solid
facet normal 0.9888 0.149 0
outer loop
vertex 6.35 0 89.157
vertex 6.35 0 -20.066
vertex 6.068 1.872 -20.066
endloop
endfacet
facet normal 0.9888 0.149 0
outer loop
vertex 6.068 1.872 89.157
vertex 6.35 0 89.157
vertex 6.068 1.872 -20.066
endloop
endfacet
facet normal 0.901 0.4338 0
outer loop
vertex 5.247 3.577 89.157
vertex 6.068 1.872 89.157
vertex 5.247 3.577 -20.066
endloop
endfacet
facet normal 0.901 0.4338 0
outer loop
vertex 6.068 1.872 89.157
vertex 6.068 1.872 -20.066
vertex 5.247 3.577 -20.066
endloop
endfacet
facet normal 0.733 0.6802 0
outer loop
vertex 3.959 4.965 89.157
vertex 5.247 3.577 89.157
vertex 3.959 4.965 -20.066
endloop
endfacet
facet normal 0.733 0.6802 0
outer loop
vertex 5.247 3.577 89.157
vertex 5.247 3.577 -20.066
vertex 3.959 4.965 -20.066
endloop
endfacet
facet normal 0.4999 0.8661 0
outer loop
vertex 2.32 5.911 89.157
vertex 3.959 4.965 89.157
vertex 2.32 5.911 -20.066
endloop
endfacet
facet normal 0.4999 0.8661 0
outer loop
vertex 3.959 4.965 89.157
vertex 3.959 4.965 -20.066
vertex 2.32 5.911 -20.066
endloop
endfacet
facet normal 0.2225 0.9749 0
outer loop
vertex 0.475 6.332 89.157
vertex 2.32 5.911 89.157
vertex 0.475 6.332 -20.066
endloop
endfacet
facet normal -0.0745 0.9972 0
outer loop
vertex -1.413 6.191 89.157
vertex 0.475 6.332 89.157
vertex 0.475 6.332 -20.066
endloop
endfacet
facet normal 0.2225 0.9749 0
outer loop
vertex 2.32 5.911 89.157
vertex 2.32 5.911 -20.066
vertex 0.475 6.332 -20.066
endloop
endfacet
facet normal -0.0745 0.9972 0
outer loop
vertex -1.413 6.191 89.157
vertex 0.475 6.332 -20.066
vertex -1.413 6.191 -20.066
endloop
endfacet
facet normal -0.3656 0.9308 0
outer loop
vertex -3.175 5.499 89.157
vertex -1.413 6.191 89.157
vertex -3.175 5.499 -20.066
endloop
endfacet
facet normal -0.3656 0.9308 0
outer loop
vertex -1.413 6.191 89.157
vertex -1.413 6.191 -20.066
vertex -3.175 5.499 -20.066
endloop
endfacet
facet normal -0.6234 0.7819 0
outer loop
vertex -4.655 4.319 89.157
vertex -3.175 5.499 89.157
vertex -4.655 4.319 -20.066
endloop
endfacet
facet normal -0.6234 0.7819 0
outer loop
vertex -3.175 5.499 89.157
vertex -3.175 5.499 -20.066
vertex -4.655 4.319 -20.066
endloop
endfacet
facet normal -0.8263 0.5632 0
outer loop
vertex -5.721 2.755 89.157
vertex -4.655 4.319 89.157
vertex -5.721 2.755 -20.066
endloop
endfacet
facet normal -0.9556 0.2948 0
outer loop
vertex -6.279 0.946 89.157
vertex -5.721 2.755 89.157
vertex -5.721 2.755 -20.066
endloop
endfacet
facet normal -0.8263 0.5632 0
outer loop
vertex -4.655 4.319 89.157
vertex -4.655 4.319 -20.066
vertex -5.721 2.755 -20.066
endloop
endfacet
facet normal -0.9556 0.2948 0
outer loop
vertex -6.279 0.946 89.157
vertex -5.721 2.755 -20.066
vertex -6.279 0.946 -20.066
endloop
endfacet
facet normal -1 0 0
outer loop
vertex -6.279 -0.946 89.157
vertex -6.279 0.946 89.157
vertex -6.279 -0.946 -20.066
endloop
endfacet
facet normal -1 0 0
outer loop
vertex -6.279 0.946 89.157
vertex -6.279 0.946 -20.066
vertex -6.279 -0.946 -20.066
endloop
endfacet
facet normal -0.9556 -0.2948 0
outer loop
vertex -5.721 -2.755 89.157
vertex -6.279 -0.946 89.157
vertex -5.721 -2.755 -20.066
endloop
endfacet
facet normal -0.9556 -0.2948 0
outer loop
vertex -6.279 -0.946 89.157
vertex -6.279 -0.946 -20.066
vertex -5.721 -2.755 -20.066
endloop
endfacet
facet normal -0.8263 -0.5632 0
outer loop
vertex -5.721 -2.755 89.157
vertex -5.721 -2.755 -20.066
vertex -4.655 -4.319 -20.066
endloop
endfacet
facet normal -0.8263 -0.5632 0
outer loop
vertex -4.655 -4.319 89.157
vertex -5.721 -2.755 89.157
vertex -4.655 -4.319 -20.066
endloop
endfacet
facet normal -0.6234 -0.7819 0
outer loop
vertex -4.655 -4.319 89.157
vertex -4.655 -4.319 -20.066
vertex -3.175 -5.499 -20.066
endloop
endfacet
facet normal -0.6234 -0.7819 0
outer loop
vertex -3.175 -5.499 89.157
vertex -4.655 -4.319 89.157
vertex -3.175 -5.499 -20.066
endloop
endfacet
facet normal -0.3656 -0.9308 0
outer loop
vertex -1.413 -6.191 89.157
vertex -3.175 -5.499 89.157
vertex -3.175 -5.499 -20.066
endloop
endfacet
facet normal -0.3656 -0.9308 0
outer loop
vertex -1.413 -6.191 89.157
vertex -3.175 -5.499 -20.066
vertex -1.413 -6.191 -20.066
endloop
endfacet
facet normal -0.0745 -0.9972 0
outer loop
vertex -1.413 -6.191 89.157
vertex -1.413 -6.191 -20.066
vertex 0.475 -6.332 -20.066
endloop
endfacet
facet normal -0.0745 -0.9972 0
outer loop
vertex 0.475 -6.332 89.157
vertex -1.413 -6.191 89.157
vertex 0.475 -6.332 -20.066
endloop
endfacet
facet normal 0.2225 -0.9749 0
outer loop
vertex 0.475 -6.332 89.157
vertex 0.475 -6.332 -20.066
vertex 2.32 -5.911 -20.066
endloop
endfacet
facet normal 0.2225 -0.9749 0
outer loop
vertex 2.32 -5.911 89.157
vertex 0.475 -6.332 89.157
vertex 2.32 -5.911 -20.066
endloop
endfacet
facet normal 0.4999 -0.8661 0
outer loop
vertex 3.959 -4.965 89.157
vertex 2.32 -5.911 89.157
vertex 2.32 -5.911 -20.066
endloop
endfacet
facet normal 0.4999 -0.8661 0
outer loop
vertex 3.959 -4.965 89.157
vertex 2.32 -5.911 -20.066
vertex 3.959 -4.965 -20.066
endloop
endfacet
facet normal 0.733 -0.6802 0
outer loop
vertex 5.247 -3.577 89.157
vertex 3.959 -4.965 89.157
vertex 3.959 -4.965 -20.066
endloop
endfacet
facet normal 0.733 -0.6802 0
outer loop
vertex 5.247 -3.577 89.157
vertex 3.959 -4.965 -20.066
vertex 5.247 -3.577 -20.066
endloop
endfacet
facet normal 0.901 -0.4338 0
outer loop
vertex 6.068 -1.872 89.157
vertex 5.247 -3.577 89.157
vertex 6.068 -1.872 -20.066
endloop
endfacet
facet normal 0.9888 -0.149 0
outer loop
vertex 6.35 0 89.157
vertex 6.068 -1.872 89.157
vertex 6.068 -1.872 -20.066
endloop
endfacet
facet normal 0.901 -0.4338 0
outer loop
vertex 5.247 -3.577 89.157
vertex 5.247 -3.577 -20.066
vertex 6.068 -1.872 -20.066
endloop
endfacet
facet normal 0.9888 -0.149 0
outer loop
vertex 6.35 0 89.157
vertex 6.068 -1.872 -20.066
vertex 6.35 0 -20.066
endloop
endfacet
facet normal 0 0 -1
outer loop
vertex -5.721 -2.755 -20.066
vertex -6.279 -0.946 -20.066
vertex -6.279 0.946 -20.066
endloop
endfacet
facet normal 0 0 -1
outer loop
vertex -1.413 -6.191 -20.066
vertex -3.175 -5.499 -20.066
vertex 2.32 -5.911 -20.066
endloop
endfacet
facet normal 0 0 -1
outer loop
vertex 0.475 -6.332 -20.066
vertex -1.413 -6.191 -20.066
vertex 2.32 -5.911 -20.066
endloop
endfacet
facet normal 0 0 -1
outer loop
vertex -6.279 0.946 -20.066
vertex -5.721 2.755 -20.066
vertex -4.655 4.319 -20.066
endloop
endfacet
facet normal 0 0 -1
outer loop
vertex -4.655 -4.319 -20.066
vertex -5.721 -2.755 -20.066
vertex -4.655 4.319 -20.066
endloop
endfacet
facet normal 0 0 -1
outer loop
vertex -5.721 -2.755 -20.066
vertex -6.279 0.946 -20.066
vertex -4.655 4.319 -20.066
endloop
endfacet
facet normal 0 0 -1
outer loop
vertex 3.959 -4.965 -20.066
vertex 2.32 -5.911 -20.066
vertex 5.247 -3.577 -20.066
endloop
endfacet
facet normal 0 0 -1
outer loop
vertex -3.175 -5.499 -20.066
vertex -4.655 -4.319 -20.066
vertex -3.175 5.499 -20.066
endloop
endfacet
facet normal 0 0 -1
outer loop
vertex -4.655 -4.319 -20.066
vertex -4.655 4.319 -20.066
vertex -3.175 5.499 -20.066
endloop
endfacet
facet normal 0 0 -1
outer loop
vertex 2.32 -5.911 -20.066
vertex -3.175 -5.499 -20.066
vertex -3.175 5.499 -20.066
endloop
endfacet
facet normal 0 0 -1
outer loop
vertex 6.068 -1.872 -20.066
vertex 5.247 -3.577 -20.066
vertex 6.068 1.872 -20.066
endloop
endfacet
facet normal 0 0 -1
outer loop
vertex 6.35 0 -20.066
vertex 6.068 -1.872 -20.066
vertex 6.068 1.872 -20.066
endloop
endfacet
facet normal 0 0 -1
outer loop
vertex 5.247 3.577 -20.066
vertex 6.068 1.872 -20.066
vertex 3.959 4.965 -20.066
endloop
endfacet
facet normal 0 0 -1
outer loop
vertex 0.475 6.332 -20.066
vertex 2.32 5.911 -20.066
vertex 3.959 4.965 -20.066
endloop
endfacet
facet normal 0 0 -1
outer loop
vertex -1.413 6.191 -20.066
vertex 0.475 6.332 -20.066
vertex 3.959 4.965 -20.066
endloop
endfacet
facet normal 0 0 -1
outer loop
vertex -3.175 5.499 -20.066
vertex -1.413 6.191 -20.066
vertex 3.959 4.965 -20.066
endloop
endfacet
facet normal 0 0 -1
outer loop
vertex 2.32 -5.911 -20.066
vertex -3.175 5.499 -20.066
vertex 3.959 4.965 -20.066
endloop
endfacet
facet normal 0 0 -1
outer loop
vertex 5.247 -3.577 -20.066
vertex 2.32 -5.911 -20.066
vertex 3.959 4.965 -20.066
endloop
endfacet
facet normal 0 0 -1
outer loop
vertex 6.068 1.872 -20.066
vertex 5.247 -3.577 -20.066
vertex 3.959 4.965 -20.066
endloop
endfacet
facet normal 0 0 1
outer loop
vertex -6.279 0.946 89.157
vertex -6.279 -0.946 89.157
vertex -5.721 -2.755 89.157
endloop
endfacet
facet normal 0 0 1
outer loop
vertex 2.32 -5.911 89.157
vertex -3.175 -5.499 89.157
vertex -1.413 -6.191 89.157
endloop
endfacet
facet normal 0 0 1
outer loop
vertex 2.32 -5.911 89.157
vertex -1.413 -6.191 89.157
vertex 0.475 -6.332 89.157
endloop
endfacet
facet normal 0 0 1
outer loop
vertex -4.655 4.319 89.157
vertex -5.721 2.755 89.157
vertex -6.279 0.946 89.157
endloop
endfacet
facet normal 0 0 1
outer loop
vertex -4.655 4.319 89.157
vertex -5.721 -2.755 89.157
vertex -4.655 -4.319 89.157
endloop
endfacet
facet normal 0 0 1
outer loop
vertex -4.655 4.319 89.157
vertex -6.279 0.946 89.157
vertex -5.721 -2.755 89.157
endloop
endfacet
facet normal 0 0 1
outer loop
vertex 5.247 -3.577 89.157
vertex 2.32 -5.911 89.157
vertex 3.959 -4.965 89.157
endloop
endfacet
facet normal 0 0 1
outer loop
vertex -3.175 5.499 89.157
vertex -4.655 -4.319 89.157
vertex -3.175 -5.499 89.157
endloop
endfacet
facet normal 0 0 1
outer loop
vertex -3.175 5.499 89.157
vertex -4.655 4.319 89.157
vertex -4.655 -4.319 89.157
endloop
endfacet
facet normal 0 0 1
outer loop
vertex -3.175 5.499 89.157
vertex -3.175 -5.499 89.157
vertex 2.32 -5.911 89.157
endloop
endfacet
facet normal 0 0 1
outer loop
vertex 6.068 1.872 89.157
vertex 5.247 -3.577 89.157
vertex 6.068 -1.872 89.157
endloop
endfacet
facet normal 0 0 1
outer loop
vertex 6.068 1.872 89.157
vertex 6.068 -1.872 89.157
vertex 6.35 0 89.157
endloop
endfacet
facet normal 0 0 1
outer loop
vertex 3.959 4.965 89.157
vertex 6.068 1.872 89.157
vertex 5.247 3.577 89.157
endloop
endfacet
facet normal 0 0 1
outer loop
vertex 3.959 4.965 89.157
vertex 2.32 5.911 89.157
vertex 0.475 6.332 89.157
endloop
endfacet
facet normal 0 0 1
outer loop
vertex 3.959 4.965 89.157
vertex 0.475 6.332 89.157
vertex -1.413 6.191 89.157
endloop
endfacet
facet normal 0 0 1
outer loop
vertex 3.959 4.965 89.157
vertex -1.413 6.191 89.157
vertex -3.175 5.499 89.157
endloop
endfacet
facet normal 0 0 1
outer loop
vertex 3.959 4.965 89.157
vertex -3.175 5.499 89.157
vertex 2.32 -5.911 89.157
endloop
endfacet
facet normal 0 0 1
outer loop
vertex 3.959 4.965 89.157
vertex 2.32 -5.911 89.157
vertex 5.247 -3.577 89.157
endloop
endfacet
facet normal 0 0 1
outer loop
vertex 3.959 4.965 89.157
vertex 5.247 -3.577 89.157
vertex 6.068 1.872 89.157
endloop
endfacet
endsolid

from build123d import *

# Parameters (mm, degrees)
BOSS_EXTRUDE1_START     = -109.223144111
BOSS_EXTRUDE1_OUTLINE_R = 6.35
BOSS_EXTRUDE1_DEPTH     = 109.223144111


# Read off the part's stored shape, not the designer's step: Boss-Extrude1
with BuildPart() as part:
    # Boss-Extrude1 outline → Boss-Extrude1 (new body)
    with BuildSketch(Plane.XY.offset(89.157144111).offset(BOSS_EXTRUDE1_START)):
        Circle(BOSS_EXTRUDE1_OUTLINE_R)
    extrude(amount=BOSS_EXTRUDE1_DEPTH)


solid = part.part
